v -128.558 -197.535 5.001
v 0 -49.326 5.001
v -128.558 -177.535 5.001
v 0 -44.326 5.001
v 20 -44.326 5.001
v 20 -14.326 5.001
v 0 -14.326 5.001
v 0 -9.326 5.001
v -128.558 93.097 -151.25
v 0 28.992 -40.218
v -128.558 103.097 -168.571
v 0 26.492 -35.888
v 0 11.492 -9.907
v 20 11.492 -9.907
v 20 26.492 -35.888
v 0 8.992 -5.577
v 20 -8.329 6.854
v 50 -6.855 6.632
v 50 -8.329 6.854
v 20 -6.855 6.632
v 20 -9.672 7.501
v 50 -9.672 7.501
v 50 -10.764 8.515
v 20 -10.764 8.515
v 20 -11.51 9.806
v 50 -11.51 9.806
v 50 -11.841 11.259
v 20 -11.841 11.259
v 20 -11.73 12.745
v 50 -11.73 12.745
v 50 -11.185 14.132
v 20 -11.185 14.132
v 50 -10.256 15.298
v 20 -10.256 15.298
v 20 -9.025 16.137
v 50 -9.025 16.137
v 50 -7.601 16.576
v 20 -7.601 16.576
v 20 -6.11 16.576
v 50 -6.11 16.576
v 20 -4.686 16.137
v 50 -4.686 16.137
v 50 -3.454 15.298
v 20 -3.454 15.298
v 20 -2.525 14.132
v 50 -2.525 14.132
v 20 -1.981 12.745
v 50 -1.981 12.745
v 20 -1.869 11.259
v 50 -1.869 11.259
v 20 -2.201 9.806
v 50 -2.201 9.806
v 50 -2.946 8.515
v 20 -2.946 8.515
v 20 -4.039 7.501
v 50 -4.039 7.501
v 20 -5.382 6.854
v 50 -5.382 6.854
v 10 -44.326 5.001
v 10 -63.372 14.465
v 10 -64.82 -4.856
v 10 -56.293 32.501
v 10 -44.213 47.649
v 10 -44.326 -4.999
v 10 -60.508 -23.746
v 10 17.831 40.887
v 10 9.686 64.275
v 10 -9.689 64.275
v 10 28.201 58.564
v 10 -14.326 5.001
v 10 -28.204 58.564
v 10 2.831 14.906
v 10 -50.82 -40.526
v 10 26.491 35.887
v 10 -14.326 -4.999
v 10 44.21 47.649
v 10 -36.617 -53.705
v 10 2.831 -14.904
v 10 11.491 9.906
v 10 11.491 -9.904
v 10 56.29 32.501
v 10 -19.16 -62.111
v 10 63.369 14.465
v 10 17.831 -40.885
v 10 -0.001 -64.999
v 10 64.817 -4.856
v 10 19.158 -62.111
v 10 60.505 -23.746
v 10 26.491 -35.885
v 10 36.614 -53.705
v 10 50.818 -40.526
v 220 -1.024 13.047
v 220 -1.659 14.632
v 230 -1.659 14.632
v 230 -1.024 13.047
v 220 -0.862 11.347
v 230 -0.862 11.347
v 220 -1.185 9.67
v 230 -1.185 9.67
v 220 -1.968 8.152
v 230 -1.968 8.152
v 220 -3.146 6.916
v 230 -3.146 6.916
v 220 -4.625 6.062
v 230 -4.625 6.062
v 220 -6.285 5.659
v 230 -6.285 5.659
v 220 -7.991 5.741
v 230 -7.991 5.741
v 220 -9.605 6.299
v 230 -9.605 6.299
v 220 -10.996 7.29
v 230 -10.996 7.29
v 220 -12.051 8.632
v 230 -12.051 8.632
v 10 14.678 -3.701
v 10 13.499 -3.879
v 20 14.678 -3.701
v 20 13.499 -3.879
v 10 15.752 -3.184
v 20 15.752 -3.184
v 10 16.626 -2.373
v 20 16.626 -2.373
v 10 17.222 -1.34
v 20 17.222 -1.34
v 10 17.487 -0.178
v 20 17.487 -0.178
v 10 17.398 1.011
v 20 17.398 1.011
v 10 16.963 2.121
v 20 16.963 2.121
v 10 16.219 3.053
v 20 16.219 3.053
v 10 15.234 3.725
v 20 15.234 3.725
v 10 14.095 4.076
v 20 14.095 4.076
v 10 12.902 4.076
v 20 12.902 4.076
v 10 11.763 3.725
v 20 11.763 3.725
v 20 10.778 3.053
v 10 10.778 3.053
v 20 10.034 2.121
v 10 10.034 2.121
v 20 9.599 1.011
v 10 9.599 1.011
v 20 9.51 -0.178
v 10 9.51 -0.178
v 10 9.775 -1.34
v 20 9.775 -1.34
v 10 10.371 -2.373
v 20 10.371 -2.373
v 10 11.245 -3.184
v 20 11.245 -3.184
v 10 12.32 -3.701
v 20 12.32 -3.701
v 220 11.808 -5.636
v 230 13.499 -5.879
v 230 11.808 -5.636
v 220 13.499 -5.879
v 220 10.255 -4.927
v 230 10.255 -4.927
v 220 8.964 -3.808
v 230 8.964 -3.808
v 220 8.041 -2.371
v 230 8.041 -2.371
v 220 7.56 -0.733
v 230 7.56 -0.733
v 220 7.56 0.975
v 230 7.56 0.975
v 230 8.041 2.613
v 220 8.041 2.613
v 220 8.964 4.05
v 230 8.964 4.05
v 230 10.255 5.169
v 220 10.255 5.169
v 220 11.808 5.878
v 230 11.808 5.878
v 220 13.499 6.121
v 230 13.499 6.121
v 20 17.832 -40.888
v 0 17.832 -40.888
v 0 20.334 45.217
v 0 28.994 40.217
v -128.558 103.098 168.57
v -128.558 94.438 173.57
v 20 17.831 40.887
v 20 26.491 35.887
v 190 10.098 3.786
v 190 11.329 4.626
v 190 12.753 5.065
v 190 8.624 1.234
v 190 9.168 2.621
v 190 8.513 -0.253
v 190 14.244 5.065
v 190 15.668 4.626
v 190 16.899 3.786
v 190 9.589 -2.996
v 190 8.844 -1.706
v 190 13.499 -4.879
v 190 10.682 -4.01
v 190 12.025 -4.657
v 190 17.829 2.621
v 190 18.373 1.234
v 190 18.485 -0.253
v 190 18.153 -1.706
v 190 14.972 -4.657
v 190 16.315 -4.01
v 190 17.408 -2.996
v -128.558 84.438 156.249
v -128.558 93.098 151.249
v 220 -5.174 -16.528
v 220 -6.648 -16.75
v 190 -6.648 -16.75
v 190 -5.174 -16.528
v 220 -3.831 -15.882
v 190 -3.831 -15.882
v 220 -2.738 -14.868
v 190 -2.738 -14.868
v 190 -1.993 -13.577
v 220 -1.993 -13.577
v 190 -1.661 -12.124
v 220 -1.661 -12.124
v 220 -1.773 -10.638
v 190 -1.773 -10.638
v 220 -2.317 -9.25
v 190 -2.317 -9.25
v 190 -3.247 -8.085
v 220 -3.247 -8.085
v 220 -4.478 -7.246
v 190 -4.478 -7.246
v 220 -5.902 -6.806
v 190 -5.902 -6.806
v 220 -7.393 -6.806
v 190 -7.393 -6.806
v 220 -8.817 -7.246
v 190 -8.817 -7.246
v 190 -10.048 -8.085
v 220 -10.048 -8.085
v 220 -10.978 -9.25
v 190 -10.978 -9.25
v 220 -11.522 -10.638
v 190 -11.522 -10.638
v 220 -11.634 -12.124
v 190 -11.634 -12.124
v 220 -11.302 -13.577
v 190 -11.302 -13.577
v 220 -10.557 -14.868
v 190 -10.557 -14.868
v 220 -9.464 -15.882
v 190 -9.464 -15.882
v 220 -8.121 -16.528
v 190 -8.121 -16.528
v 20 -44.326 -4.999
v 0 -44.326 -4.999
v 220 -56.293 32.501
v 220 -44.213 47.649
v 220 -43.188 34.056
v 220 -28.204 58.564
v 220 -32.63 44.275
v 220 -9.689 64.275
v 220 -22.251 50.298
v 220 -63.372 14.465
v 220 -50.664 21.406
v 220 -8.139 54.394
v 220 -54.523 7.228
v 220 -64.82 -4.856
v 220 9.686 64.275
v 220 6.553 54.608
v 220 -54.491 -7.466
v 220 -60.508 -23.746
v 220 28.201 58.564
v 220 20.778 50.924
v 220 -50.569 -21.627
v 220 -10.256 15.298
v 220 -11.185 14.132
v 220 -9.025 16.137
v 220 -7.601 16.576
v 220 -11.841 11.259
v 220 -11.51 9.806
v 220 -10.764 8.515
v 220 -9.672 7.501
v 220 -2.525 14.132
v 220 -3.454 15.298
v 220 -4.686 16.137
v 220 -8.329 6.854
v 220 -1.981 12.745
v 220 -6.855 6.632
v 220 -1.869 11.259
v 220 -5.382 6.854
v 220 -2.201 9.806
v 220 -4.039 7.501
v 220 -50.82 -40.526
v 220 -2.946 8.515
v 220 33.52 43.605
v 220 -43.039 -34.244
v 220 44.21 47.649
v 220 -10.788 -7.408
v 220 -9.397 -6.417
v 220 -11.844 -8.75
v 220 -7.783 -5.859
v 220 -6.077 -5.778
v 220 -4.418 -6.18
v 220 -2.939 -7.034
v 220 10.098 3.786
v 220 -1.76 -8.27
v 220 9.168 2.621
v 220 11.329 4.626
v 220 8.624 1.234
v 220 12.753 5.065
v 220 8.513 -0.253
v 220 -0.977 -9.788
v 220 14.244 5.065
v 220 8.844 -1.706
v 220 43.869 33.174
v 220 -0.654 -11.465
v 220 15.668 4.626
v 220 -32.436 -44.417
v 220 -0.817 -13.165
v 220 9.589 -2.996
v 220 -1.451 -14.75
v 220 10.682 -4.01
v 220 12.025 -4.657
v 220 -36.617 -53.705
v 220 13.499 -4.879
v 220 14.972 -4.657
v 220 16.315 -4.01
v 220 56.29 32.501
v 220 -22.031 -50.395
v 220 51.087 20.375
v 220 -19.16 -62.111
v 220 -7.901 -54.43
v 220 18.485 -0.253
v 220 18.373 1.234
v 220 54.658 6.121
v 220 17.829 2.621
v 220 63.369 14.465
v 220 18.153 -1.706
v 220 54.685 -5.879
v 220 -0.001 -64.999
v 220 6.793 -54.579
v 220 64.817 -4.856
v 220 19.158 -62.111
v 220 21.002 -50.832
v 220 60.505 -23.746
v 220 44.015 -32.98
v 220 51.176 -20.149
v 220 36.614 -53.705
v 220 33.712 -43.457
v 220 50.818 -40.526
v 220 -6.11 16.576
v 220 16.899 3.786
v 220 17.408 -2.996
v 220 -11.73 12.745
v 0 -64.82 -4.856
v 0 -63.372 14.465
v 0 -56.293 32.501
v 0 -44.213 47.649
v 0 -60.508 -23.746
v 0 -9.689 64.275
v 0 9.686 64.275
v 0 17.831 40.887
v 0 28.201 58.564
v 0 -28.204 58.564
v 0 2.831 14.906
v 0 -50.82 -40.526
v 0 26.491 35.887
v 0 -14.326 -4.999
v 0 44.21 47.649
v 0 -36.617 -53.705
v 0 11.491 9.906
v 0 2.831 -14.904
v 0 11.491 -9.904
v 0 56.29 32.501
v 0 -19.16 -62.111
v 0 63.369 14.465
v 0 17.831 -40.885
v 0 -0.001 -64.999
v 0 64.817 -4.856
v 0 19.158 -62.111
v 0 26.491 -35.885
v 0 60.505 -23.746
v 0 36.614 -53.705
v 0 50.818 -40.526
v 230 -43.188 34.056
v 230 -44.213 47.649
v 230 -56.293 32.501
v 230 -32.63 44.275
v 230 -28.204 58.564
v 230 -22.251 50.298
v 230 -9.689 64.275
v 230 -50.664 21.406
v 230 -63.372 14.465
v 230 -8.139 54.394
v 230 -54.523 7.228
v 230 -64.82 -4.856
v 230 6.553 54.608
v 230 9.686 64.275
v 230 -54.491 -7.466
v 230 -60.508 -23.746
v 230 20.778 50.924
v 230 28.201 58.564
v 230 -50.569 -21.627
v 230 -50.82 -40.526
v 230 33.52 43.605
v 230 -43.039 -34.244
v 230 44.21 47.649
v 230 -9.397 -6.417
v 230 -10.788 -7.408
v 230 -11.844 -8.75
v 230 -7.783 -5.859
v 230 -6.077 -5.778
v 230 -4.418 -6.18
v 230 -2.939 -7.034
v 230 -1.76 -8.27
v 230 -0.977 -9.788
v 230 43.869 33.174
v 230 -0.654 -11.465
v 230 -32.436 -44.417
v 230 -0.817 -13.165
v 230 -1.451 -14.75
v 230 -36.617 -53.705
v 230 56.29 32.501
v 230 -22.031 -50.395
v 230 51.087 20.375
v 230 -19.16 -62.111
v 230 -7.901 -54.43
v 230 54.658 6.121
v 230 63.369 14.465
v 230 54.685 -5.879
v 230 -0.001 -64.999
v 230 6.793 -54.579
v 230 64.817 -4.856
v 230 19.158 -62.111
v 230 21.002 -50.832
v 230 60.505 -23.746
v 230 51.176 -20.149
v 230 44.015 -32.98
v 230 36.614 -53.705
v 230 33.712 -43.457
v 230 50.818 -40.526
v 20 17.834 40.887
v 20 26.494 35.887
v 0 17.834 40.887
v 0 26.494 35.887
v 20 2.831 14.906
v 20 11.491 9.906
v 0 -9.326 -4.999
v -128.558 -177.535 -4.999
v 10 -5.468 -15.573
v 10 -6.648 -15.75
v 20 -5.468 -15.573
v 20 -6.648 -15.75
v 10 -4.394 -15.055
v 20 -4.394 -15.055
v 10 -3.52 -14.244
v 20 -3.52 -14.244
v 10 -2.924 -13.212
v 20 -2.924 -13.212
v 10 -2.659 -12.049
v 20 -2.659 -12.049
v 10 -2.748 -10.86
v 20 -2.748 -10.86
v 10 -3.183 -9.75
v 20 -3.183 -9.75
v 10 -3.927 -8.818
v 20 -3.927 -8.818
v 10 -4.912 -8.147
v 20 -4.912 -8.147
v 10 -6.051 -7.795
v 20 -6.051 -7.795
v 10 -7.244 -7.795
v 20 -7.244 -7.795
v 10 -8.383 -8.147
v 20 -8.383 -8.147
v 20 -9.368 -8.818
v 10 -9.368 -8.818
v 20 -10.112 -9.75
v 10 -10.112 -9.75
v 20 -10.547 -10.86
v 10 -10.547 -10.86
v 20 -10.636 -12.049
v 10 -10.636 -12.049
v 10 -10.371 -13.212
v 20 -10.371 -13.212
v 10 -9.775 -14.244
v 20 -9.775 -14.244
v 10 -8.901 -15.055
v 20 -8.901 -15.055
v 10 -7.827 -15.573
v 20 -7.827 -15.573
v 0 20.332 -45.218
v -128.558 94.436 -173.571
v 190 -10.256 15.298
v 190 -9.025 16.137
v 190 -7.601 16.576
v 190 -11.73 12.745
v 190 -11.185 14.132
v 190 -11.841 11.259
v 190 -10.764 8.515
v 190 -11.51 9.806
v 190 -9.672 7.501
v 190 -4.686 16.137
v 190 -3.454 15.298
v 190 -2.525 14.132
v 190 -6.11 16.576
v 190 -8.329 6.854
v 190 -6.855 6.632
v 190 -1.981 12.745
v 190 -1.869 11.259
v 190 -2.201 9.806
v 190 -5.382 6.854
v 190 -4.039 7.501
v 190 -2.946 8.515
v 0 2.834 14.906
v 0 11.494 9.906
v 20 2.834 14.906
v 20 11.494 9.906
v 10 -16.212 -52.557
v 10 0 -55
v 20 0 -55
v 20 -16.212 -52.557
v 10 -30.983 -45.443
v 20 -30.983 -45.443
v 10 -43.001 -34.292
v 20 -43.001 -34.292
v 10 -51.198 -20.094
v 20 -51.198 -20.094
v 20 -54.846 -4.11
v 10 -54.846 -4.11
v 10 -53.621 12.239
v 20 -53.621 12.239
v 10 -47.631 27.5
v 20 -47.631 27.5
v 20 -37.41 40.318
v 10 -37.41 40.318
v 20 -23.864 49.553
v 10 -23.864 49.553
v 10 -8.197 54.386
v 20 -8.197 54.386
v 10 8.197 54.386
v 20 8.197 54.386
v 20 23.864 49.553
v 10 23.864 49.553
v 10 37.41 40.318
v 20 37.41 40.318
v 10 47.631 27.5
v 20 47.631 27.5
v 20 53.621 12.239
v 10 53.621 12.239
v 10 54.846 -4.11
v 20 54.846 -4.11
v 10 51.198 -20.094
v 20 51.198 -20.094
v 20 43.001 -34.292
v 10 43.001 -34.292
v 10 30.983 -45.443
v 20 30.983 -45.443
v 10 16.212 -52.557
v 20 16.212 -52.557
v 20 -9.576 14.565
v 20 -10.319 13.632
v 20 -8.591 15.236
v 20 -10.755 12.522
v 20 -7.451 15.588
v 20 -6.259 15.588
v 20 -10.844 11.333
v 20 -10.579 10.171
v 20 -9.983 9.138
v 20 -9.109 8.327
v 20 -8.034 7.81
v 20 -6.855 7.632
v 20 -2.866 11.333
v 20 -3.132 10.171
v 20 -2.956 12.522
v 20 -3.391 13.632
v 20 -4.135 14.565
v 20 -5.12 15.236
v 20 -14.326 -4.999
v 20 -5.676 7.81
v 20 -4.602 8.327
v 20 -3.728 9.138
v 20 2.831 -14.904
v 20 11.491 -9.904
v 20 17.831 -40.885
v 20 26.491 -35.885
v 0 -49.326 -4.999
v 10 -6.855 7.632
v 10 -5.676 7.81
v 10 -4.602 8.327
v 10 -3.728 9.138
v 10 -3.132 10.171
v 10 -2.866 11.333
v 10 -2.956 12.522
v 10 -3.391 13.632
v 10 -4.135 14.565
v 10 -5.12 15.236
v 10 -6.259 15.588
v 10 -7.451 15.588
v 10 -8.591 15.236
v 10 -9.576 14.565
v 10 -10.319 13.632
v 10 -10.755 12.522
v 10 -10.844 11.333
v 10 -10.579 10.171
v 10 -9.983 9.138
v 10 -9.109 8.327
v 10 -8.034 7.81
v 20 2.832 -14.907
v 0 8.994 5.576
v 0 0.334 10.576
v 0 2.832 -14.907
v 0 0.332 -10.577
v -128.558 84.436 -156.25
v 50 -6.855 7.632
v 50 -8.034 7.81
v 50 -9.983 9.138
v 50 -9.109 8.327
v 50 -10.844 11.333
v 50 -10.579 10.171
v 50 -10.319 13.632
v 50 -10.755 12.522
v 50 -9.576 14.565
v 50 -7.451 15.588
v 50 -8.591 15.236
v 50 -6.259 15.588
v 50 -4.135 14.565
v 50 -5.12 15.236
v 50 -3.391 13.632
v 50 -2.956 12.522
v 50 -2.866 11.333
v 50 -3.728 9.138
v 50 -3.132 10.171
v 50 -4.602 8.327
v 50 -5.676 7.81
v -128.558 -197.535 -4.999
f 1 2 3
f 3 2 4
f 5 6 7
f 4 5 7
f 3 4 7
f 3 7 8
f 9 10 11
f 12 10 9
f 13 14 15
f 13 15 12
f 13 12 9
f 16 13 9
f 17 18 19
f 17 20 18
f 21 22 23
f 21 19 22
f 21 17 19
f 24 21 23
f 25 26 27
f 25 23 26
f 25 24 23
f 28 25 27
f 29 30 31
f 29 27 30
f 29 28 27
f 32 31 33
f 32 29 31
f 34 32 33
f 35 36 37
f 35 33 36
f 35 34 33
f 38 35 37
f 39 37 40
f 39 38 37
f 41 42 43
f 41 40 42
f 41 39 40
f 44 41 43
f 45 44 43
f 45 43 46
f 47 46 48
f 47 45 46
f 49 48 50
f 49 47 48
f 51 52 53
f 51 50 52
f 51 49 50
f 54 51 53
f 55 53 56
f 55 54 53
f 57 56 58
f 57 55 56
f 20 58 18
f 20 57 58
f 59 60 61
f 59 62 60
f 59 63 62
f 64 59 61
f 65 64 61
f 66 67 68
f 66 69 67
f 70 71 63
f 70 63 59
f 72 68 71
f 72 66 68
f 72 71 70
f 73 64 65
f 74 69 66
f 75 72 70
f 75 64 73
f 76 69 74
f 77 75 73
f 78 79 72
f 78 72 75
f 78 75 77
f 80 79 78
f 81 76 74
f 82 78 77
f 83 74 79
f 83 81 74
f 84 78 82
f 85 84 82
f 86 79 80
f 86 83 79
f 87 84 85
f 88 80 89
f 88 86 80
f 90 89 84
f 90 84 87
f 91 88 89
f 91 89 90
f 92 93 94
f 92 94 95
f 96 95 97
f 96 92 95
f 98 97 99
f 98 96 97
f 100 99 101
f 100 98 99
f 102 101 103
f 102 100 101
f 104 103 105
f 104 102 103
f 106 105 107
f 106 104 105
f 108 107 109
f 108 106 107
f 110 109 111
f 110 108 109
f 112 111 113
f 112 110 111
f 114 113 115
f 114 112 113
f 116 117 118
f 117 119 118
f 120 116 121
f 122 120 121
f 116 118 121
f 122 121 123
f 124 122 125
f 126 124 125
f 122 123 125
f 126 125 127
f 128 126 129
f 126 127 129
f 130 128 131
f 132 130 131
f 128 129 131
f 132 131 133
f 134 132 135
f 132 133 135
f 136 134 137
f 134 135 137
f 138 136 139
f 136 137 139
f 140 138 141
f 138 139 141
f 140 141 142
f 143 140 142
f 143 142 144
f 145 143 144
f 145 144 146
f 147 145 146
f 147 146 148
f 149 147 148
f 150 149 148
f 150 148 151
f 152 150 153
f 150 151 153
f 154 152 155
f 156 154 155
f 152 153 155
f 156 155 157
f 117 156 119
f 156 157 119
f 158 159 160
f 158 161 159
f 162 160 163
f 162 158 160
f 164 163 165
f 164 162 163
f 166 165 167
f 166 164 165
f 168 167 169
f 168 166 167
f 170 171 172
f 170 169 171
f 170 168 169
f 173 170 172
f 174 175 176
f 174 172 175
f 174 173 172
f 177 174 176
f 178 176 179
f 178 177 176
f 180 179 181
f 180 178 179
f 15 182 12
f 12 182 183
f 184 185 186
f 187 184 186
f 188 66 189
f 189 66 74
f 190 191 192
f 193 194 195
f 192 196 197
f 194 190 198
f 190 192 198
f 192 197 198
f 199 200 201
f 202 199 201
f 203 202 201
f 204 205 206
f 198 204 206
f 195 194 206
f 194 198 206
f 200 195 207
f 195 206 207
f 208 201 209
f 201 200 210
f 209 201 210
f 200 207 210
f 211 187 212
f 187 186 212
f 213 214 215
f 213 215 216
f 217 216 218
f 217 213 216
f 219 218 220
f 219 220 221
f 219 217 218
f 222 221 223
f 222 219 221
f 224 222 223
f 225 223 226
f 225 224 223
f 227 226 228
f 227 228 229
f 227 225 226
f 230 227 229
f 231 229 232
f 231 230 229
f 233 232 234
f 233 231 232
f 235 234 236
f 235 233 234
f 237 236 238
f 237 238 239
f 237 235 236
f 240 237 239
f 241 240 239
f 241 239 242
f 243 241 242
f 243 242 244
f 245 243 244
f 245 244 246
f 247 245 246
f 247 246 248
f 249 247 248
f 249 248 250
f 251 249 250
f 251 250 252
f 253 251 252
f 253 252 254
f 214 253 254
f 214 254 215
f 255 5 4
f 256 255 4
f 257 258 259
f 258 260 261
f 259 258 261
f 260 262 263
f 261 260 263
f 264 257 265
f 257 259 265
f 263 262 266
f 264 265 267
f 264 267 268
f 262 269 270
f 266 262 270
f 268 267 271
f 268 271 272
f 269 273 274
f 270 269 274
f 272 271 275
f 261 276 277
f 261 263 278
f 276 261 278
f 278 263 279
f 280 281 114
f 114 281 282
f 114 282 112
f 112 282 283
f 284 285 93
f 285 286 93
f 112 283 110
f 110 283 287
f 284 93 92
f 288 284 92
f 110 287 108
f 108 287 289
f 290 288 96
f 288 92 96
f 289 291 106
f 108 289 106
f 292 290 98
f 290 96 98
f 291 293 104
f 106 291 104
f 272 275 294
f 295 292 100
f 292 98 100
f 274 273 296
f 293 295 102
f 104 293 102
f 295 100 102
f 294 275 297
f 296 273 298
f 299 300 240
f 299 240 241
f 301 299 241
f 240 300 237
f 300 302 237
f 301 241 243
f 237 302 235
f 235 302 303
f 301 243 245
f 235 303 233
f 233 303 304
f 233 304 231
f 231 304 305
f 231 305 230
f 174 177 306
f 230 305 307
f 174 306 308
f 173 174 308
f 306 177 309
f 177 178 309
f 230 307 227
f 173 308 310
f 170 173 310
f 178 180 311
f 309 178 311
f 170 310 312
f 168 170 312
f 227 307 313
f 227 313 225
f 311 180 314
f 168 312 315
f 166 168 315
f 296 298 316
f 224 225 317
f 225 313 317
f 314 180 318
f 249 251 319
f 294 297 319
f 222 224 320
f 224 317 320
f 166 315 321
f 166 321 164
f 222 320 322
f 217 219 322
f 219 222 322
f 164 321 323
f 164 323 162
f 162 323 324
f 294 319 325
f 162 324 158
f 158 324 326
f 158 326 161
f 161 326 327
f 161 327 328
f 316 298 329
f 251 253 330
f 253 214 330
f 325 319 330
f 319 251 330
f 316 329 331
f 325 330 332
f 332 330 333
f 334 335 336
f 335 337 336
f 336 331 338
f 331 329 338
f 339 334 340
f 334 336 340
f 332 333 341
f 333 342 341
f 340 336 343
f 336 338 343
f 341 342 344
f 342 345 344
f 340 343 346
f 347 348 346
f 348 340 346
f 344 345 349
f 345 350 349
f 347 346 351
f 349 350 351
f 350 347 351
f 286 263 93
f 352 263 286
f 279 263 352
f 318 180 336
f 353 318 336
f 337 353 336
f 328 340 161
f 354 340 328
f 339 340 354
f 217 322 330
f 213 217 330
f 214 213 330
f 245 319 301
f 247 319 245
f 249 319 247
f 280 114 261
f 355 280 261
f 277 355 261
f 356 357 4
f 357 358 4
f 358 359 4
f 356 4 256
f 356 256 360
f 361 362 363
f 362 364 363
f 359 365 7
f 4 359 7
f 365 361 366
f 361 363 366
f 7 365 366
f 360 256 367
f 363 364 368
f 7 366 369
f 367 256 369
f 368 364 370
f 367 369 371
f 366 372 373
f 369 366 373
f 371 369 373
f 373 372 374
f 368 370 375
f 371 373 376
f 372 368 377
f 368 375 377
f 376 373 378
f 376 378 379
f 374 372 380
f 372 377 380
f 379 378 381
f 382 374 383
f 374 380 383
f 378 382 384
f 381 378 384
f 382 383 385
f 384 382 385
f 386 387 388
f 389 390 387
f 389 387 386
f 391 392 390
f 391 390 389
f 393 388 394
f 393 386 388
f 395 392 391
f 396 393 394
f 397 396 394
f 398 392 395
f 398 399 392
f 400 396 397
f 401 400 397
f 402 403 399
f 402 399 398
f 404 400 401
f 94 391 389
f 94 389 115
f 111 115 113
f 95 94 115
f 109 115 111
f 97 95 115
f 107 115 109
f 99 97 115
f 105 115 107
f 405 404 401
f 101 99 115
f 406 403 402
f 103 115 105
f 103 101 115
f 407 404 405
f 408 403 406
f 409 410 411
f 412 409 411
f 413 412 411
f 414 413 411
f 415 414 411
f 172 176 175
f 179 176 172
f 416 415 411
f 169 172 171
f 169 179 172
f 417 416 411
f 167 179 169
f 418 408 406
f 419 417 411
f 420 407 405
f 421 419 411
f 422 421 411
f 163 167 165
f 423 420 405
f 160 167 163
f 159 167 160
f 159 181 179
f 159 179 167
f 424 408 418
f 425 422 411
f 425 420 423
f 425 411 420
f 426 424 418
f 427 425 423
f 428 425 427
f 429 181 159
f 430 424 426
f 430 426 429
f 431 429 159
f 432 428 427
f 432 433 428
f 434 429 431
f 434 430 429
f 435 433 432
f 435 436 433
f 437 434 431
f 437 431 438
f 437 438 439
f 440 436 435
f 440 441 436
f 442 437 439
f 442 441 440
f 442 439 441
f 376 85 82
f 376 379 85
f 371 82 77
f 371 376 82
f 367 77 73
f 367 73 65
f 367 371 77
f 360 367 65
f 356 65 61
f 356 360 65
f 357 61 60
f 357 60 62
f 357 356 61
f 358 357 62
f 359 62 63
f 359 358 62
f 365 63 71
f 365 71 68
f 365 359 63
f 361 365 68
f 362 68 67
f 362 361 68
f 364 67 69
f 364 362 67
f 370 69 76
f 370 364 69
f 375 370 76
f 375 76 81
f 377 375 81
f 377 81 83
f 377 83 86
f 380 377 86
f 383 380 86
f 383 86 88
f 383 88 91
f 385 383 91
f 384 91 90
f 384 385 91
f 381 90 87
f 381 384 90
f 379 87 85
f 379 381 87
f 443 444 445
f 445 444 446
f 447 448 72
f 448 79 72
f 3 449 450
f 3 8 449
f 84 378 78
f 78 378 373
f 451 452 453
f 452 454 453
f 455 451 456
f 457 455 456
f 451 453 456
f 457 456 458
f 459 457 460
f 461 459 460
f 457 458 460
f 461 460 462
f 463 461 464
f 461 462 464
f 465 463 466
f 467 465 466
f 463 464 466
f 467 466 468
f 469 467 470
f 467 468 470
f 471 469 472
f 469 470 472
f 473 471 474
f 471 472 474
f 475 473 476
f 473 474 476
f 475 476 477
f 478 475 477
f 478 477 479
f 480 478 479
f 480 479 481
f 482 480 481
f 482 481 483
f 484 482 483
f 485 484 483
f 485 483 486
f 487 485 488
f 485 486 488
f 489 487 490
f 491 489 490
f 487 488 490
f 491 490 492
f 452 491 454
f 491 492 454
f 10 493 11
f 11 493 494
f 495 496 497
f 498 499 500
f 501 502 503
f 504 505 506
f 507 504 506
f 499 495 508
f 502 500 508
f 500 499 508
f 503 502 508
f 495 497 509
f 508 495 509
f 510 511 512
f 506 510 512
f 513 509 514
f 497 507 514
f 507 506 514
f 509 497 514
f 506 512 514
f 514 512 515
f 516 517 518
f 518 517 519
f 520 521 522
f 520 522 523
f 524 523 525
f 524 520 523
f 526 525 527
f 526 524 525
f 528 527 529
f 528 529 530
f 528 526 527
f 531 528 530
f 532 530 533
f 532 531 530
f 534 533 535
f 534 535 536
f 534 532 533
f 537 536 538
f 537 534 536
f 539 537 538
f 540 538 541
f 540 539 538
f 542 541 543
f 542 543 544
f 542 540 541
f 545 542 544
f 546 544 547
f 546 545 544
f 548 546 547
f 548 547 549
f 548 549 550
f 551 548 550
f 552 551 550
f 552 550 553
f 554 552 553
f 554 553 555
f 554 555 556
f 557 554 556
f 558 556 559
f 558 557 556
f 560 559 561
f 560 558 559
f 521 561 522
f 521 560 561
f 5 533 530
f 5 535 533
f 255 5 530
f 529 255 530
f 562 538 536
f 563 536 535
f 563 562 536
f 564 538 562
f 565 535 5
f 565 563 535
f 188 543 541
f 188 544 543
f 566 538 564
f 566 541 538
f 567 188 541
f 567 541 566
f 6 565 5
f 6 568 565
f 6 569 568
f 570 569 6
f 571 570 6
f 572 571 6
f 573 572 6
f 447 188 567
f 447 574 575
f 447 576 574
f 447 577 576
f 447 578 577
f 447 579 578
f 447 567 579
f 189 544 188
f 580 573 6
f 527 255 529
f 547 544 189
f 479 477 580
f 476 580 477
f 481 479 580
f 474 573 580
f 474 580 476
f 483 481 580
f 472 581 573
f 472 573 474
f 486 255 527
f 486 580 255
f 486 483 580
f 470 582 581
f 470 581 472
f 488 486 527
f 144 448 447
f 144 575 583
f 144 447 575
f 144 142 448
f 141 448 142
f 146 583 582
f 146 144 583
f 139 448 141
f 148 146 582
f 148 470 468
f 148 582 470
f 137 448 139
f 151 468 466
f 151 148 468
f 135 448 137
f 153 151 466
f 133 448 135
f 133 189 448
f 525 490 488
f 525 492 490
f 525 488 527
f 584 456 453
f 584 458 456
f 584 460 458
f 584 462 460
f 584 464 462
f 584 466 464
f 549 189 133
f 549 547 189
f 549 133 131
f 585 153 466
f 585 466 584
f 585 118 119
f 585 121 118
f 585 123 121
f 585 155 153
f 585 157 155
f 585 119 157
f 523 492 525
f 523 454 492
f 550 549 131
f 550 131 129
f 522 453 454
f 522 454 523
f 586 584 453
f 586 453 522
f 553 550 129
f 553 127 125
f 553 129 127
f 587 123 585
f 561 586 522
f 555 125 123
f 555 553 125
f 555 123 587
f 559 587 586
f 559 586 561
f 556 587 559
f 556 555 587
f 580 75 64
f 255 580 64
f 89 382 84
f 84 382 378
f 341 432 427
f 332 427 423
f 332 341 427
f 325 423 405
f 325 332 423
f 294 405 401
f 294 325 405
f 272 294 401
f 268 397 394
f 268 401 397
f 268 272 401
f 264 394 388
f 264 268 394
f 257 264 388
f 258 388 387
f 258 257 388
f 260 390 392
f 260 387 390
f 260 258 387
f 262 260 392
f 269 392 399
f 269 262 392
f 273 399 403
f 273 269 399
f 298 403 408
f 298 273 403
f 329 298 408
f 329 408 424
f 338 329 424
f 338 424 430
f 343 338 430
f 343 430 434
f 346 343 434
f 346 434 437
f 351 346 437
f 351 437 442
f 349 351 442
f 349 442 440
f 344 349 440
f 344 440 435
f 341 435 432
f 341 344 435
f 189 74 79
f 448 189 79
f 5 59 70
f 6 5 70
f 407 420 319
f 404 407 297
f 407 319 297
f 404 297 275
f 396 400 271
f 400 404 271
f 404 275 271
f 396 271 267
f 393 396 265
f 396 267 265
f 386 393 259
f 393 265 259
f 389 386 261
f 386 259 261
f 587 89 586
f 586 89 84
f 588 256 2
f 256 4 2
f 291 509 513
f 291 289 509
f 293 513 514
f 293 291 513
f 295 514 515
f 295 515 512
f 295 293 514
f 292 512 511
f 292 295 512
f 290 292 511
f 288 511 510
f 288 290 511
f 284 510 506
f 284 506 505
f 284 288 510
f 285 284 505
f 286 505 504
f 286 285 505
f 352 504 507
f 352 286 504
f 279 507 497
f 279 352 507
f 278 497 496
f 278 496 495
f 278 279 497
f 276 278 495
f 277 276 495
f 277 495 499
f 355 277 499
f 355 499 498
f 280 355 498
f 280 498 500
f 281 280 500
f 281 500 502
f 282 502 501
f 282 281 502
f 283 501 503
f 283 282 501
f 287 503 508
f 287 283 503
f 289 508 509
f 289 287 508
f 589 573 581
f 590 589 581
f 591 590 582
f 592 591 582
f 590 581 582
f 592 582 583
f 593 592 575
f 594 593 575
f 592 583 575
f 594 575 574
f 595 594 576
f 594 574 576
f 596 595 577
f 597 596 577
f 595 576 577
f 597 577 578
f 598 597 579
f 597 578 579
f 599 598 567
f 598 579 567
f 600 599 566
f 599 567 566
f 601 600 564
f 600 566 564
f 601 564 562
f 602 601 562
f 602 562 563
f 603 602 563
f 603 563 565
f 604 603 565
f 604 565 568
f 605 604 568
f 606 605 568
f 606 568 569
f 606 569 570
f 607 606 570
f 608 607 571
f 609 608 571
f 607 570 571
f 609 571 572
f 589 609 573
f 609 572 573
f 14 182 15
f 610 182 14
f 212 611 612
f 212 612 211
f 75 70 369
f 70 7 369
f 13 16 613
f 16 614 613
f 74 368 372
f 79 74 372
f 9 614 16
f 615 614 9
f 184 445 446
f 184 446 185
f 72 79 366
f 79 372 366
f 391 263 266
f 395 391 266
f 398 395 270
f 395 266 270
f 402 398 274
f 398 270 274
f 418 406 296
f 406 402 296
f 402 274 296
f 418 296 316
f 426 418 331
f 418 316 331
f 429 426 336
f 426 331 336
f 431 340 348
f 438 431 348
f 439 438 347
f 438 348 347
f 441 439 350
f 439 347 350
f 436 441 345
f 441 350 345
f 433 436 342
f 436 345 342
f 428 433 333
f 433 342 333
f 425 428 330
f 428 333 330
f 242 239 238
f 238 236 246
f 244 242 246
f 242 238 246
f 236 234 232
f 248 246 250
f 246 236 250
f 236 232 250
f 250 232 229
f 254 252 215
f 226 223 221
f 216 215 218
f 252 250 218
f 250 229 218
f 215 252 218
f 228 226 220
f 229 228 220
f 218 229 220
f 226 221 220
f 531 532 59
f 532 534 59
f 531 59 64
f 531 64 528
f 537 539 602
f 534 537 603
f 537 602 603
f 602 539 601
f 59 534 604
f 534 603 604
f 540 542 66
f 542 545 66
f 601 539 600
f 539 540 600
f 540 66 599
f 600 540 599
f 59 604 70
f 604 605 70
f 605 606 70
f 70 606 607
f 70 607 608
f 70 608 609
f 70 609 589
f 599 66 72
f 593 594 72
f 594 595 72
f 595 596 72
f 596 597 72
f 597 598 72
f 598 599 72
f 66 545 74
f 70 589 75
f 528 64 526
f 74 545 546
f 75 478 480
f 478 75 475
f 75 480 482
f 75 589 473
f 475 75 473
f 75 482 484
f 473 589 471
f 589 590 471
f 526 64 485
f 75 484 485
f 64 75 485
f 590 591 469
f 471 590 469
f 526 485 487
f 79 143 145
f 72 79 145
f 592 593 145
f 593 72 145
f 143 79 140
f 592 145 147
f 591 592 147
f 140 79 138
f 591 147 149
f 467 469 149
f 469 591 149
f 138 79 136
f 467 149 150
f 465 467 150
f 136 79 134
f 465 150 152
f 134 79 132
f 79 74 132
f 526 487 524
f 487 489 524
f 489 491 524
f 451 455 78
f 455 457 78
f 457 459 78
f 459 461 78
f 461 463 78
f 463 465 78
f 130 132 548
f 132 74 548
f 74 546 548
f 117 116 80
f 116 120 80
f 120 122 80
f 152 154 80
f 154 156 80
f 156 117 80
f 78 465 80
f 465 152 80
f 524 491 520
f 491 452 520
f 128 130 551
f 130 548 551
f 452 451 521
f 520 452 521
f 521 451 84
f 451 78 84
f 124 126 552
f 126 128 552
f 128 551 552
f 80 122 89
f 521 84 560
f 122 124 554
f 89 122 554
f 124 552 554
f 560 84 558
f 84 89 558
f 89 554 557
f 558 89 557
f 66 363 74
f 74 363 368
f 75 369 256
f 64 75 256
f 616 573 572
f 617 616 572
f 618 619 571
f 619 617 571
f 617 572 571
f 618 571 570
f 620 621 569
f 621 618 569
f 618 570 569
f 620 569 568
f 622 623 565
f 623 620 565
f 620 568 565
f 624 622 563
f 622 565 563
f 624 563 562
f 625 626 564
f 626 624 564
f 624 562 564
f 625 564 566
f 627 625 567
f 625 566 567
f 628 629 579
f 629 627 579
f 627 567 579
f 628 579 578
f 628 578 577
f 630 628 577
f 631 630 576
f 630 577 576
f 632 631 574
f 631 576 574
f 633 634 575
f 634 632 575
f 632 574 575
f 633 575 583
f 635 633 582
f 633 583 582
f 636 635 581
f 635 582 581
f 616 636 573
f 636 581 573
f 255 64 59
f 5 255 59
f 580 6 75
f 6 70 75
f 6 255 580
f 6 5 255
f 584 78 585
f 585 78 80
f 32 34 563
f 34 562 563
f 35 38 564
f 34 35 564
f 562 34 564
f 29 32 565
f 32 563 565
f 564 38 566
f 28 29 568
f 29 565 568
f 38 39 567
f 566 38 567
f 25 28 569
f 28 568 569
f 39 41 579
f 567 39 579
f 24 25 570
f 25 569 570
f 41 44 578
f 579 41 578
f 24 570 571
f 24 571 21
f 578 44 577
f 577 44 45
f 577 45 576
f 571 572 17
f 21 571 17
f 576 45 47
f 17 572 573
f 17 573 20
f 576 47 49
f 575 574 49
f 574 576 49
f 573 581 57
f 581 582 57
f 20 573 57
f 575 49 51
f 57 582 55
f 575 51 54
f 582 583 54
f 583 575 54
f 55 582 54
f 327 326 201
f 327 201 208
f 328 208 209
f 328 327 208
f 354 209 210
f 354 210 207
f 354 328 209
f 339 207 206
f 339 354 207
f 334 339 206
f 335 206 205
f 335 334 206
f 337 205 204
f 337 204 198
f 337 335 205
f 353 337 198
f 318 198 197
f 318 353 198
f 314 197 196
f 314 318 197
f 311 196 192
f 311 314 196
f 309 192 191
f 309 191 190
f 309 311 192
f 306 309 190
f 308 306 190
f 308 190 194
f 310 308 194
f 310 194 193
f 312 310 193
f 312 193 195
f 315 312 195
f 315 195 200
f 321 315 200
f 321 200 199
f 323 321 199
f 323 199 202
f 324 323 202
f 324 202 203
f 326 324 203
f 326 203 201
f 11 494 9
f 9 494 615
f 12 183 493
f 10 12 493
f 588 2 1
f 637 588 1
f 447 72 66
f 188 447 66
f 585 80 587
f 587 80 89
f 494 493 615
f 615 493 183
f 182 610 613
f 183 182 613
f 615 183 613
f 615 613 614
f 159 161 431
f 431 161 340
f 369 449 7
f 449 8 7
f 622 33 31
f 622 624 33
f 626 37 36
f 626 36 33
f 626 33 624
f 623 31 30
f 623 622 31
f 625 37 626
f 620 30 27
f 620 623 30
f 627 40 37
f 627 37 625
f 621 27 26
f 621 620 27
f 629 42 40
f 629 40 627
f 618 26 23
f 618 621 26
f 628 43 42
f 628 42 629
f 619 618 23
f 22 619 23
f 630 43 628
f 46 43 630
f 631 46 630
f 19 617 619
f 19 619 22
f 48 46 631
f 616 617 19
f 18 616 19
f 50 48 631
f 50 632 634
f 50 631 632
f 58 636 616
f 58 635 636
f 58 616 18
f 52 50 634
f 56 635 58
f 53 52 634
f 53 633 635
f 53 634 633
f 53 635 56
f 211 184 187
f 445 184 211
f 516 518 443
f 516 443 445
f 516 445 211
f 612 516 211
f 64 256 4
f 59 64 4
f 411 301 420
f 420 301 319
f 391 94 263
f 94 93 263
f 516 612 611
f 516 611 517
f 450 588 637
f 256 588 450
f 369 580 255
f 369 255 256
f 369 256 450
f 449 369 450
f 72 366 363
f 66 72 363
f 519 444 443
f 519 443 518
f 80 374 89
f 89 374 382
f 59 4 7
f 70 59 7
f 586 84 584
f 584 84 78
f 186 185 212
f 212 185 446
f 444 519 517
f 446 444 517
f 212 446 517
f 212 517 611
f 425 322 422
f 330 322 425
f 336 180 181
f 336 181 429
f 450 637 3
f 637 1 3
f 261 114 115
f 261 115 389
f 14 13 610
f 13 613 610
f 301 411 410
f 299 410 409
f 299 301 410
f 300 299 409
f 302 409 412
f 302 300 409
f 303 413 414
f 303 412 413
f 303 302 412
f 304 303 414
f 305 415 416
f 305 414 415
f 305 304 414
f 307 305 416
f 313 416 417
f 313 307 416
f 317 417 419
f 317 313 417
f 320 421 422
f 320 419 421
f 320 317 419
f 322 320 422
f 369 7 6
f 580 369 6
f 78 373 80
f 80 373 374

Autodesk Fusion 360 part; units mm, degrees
sketch "main" plane through (0, 0, 0) normal (1, 0, 0) x (0, 0, -1)
  circle A0 centre (-0.121, 13.4986) radius 6
  circle A1 centre (0, 0) radius 55
  circle A2 centre (-0.121, 13.4986) radius 5
  circle A3 centre (-0.001, -0.0014) radius 65
  line L0 (5.879, 13.4986) -> (5.879, 64.7321)
  line L1 (-6.121, 13.4986) -> (-6.121, 64.7099)
  circle A4 centre (-11.6323, -6.8553) radius 5
  line L2 (-8.6323, -12.0514) -> (-52.9826, -37.6571)
  line L3 (-14.6323, -1.6591) -> (-59.0018, -27.2759)
  circle A5 centre (-11.6323, -6.8553) radius 6
  circle A6 centre (11.7504, -6.6475) radius 5
  line L4 (14.7504, -1.4513) -> (59.1006, -27.0569)
  line L5 (8.7504, -11.8436) -> (53.1199, -37.4604)
  circle A7 centre (11.7504, -6.6475) radius 6
  line L6 (4.999, -44.3259) -> (-5.001, -44.3259)
  line L7 (-5.001, -44.3259) -> (-5.001, -14.3259)
  line L8 (-5.001, -14.3259) -> (4.999, -14.3259)
  line L9 (4.999, -14.3259) -> (4.999, -44.3259)
  line L10 (9.9044, 11.491) -> (35.8852, 26.491)
  line L11 (40.8852, 17.8307) -> (14.9044, 2.8307)
  line L12 (14.9044, 2.8307) -> (9.9044, 11.491)
  line L13 (35.8852, 26.491) -> (40.8852, 17.8307)
  line L14 (-14.9063, 2.8307) -> (-40.8871, 17.8307)
  line L15 (-35.8871, 26.491) -> (-9.9063, 11.491)
  line L16 (-9.9063, 11.491) -> (-14.9063, 2.8307)
  line L17 (-40.8871, 17.8307) -> (-35.8871, 26.491)
  circle A8 centre (-0.121, 13.4986) radius 4
  circle A9 centre (-11.6323, -6.8553) radius 4
  circle A10 centre (11.7504, -6.6475) radius 4
  dimension "d7" = 12
  dimension "d8" = 13.5
  dimension "d11" = 110
  dimension "d19" = 10
  dimension "d27" = 130
  dimension "d70" = 360
  dimension "d77" = 30
  dimension "d79" = 360
  dimension "d84" = 10
  dimension "d106" = 5
  dimension "d114" = 8
extrude "Extrude11" add sketch "main" along normal blind 10 contours A0 | A0 A1 L0 L1 L2 L3 A5 L4 L5 A7 | A0 A1 L0 L1 | A1 A3 L0 L4 | A1 A3 L0 L1 | A1 A3 L1 L3 | A1 L2 L3 A5 | A1 A3 L2 L3 | A1 A3 L4 L5 | A1 L4 L5 A7 | A1 A3 L2 L5 | A5 | A7 | A2 | A4 | A6 | A8 | A9 | A10 makes body 1
sketch "leg" plane through (0, 0, 5.001) normal (0, 0, -1) x (-1, 0, 0)
  line L0 (0, -44.3259) -> (0, -14.3259)
  line L1 (0, -14.3259) -> (-10, -14.3259)
  line L2 (128.5575, -197.5348) -> (128.5575, -177.5348)
  line L3 (0, -14.3259) -> (-20, -14.3259)
  line L4 (-20, -44.3259) -> (-20, -14.3259)
  line L5 (0, -9.3259) -> (128.5575, -177.5348)
  line L6 (0, -44.3259) -> (0, -49.3259)
  line L7 (0, -49.3259) -> (128.5575, -197.5348)
  line L8 (-20, -44.3259) -> (0, -44.3259)
  line L9 (0, -9.3259) -> (0, -14.3259)
  line L10 (0, -44.3259) -> (0, -14.3259)
  line L11 (0, -14.3259) -> (-10, -14.3259)
  line L12 (-10, -14.3259) -> (-10, -44.3259)
  line L13 (-10, -44.3259) -> (0, -44.3259)
  dimension "d81" = 200
  dimension "d83" = 20
  dimension "d89" = 20
  dimension "d103" = 5
extrude "Extrude14" add sketch "leg" along normal blind 10 separate body makes body 2
pattern_circular "C-Pattern6" count 3 over 360 about axis through (1.75, 0, 0) along (1, 0, 0) of "Extrude14" makes body 3 makes body 4
extrude "Extrude15" add sketch "main" along normal blind 10 from surface at 10 separate body contours A0 | A0 A1 L0 L1 L2 L3 A5 L4 L5 A7 | A0 A1 L0 L1 | A1 L2 L3 A5 | A1 L4 L5 A7 | A5 | A7 | A2 | A4 | A6 | A8 | A9 | A10 makes body 5
extrude "Extrude16" cut sketch "main" against normal through all from surface at 20 contours A8 | A9 | A10 bodies 5
extrude "Extrude17" add sketch "main" along normal blind 10 from surface at 220 separate body contours A0 | A0 A1 L0 L1 | A1 A3 L0 L4 | A1 A3 L0 L1 | A1 A3 L1 L3 | A1 L2 L3 A5 | A1 A3 L2 L3 | A1 A3 L4 L5 | A1 L4 L5 A7 | A1 A3 L2 L5 | A5 | A7 | A2 | A4 | A6 | A8 | A9 | A10 makes body 6
extrude "Extrude18" add sketch "main" against normal blind 30 from surface at 220 contours A2 | A4 | A6 | A8 | A9 | A10 bodies 6
copy_body "Body->Comp1" bodies 1 removing the originals makes body 7 in component "base"
copy_body "Body->Comp2" bodies 5 removing the originals makes body 8 in component "mount_lower"
copy_body "Body->Comp4" bodies 2 removing the originals makes body 9 in component "leg1"
copy_body "Body->Comp5" bodies 3 removing the originals makes body 10 in component "leg2"
copy_body "Body->Comp6" bodies 4 removing the originals makes body 11 in component "leg3"
copy_body "Body->Comp7" bodies 6 removing the originals makes body 12 in component "mount_upper"
extrude "Extrude1" add sketch "main" along normal blind 30 from surface at 20 separate body contours A4 makes body 13 in component "sleeve"
component "base" placed x (1, 0, 0) y (0, 1, 0) z (0, 0, 1) at (0, 0, 0)
component "mount_lower" placed x (1, 0, 0) y (0, 1, 0) z (0, 0, 1) at (0, 0, 0)
component "leg1" placed x (1, 0, 0) y (0, 1, 0) z (0, 0, 1) at (0, 0, 0)
component "leg2" placed x (1, 0, 0) y (0, 1, 0) z (0, 0, 1) at (0, 0, 0)
component "leg3" placed x (1, 0, 0) y (0, 1, 0) z (0, 0, 1) at (0, 0, 0)
component "mount_upper" placed x (1, 0, 0) y (0, 1, 0) z (0, 0, 1) at (0, 0, 0)
component "sleeve" placed x (1, 0, 0) y (0, 1, 0) z (0, 0, 1) at (0, 0, 0)
equation "d7 = tube_od"
equation "d8 = body_dia / 2 + tube_od / 2"
equation "d19 = tube_id"
equation "body_dia = 15 mm"
equation "tube_od = 12 mm"
equation "tube_id = 10 mm"
